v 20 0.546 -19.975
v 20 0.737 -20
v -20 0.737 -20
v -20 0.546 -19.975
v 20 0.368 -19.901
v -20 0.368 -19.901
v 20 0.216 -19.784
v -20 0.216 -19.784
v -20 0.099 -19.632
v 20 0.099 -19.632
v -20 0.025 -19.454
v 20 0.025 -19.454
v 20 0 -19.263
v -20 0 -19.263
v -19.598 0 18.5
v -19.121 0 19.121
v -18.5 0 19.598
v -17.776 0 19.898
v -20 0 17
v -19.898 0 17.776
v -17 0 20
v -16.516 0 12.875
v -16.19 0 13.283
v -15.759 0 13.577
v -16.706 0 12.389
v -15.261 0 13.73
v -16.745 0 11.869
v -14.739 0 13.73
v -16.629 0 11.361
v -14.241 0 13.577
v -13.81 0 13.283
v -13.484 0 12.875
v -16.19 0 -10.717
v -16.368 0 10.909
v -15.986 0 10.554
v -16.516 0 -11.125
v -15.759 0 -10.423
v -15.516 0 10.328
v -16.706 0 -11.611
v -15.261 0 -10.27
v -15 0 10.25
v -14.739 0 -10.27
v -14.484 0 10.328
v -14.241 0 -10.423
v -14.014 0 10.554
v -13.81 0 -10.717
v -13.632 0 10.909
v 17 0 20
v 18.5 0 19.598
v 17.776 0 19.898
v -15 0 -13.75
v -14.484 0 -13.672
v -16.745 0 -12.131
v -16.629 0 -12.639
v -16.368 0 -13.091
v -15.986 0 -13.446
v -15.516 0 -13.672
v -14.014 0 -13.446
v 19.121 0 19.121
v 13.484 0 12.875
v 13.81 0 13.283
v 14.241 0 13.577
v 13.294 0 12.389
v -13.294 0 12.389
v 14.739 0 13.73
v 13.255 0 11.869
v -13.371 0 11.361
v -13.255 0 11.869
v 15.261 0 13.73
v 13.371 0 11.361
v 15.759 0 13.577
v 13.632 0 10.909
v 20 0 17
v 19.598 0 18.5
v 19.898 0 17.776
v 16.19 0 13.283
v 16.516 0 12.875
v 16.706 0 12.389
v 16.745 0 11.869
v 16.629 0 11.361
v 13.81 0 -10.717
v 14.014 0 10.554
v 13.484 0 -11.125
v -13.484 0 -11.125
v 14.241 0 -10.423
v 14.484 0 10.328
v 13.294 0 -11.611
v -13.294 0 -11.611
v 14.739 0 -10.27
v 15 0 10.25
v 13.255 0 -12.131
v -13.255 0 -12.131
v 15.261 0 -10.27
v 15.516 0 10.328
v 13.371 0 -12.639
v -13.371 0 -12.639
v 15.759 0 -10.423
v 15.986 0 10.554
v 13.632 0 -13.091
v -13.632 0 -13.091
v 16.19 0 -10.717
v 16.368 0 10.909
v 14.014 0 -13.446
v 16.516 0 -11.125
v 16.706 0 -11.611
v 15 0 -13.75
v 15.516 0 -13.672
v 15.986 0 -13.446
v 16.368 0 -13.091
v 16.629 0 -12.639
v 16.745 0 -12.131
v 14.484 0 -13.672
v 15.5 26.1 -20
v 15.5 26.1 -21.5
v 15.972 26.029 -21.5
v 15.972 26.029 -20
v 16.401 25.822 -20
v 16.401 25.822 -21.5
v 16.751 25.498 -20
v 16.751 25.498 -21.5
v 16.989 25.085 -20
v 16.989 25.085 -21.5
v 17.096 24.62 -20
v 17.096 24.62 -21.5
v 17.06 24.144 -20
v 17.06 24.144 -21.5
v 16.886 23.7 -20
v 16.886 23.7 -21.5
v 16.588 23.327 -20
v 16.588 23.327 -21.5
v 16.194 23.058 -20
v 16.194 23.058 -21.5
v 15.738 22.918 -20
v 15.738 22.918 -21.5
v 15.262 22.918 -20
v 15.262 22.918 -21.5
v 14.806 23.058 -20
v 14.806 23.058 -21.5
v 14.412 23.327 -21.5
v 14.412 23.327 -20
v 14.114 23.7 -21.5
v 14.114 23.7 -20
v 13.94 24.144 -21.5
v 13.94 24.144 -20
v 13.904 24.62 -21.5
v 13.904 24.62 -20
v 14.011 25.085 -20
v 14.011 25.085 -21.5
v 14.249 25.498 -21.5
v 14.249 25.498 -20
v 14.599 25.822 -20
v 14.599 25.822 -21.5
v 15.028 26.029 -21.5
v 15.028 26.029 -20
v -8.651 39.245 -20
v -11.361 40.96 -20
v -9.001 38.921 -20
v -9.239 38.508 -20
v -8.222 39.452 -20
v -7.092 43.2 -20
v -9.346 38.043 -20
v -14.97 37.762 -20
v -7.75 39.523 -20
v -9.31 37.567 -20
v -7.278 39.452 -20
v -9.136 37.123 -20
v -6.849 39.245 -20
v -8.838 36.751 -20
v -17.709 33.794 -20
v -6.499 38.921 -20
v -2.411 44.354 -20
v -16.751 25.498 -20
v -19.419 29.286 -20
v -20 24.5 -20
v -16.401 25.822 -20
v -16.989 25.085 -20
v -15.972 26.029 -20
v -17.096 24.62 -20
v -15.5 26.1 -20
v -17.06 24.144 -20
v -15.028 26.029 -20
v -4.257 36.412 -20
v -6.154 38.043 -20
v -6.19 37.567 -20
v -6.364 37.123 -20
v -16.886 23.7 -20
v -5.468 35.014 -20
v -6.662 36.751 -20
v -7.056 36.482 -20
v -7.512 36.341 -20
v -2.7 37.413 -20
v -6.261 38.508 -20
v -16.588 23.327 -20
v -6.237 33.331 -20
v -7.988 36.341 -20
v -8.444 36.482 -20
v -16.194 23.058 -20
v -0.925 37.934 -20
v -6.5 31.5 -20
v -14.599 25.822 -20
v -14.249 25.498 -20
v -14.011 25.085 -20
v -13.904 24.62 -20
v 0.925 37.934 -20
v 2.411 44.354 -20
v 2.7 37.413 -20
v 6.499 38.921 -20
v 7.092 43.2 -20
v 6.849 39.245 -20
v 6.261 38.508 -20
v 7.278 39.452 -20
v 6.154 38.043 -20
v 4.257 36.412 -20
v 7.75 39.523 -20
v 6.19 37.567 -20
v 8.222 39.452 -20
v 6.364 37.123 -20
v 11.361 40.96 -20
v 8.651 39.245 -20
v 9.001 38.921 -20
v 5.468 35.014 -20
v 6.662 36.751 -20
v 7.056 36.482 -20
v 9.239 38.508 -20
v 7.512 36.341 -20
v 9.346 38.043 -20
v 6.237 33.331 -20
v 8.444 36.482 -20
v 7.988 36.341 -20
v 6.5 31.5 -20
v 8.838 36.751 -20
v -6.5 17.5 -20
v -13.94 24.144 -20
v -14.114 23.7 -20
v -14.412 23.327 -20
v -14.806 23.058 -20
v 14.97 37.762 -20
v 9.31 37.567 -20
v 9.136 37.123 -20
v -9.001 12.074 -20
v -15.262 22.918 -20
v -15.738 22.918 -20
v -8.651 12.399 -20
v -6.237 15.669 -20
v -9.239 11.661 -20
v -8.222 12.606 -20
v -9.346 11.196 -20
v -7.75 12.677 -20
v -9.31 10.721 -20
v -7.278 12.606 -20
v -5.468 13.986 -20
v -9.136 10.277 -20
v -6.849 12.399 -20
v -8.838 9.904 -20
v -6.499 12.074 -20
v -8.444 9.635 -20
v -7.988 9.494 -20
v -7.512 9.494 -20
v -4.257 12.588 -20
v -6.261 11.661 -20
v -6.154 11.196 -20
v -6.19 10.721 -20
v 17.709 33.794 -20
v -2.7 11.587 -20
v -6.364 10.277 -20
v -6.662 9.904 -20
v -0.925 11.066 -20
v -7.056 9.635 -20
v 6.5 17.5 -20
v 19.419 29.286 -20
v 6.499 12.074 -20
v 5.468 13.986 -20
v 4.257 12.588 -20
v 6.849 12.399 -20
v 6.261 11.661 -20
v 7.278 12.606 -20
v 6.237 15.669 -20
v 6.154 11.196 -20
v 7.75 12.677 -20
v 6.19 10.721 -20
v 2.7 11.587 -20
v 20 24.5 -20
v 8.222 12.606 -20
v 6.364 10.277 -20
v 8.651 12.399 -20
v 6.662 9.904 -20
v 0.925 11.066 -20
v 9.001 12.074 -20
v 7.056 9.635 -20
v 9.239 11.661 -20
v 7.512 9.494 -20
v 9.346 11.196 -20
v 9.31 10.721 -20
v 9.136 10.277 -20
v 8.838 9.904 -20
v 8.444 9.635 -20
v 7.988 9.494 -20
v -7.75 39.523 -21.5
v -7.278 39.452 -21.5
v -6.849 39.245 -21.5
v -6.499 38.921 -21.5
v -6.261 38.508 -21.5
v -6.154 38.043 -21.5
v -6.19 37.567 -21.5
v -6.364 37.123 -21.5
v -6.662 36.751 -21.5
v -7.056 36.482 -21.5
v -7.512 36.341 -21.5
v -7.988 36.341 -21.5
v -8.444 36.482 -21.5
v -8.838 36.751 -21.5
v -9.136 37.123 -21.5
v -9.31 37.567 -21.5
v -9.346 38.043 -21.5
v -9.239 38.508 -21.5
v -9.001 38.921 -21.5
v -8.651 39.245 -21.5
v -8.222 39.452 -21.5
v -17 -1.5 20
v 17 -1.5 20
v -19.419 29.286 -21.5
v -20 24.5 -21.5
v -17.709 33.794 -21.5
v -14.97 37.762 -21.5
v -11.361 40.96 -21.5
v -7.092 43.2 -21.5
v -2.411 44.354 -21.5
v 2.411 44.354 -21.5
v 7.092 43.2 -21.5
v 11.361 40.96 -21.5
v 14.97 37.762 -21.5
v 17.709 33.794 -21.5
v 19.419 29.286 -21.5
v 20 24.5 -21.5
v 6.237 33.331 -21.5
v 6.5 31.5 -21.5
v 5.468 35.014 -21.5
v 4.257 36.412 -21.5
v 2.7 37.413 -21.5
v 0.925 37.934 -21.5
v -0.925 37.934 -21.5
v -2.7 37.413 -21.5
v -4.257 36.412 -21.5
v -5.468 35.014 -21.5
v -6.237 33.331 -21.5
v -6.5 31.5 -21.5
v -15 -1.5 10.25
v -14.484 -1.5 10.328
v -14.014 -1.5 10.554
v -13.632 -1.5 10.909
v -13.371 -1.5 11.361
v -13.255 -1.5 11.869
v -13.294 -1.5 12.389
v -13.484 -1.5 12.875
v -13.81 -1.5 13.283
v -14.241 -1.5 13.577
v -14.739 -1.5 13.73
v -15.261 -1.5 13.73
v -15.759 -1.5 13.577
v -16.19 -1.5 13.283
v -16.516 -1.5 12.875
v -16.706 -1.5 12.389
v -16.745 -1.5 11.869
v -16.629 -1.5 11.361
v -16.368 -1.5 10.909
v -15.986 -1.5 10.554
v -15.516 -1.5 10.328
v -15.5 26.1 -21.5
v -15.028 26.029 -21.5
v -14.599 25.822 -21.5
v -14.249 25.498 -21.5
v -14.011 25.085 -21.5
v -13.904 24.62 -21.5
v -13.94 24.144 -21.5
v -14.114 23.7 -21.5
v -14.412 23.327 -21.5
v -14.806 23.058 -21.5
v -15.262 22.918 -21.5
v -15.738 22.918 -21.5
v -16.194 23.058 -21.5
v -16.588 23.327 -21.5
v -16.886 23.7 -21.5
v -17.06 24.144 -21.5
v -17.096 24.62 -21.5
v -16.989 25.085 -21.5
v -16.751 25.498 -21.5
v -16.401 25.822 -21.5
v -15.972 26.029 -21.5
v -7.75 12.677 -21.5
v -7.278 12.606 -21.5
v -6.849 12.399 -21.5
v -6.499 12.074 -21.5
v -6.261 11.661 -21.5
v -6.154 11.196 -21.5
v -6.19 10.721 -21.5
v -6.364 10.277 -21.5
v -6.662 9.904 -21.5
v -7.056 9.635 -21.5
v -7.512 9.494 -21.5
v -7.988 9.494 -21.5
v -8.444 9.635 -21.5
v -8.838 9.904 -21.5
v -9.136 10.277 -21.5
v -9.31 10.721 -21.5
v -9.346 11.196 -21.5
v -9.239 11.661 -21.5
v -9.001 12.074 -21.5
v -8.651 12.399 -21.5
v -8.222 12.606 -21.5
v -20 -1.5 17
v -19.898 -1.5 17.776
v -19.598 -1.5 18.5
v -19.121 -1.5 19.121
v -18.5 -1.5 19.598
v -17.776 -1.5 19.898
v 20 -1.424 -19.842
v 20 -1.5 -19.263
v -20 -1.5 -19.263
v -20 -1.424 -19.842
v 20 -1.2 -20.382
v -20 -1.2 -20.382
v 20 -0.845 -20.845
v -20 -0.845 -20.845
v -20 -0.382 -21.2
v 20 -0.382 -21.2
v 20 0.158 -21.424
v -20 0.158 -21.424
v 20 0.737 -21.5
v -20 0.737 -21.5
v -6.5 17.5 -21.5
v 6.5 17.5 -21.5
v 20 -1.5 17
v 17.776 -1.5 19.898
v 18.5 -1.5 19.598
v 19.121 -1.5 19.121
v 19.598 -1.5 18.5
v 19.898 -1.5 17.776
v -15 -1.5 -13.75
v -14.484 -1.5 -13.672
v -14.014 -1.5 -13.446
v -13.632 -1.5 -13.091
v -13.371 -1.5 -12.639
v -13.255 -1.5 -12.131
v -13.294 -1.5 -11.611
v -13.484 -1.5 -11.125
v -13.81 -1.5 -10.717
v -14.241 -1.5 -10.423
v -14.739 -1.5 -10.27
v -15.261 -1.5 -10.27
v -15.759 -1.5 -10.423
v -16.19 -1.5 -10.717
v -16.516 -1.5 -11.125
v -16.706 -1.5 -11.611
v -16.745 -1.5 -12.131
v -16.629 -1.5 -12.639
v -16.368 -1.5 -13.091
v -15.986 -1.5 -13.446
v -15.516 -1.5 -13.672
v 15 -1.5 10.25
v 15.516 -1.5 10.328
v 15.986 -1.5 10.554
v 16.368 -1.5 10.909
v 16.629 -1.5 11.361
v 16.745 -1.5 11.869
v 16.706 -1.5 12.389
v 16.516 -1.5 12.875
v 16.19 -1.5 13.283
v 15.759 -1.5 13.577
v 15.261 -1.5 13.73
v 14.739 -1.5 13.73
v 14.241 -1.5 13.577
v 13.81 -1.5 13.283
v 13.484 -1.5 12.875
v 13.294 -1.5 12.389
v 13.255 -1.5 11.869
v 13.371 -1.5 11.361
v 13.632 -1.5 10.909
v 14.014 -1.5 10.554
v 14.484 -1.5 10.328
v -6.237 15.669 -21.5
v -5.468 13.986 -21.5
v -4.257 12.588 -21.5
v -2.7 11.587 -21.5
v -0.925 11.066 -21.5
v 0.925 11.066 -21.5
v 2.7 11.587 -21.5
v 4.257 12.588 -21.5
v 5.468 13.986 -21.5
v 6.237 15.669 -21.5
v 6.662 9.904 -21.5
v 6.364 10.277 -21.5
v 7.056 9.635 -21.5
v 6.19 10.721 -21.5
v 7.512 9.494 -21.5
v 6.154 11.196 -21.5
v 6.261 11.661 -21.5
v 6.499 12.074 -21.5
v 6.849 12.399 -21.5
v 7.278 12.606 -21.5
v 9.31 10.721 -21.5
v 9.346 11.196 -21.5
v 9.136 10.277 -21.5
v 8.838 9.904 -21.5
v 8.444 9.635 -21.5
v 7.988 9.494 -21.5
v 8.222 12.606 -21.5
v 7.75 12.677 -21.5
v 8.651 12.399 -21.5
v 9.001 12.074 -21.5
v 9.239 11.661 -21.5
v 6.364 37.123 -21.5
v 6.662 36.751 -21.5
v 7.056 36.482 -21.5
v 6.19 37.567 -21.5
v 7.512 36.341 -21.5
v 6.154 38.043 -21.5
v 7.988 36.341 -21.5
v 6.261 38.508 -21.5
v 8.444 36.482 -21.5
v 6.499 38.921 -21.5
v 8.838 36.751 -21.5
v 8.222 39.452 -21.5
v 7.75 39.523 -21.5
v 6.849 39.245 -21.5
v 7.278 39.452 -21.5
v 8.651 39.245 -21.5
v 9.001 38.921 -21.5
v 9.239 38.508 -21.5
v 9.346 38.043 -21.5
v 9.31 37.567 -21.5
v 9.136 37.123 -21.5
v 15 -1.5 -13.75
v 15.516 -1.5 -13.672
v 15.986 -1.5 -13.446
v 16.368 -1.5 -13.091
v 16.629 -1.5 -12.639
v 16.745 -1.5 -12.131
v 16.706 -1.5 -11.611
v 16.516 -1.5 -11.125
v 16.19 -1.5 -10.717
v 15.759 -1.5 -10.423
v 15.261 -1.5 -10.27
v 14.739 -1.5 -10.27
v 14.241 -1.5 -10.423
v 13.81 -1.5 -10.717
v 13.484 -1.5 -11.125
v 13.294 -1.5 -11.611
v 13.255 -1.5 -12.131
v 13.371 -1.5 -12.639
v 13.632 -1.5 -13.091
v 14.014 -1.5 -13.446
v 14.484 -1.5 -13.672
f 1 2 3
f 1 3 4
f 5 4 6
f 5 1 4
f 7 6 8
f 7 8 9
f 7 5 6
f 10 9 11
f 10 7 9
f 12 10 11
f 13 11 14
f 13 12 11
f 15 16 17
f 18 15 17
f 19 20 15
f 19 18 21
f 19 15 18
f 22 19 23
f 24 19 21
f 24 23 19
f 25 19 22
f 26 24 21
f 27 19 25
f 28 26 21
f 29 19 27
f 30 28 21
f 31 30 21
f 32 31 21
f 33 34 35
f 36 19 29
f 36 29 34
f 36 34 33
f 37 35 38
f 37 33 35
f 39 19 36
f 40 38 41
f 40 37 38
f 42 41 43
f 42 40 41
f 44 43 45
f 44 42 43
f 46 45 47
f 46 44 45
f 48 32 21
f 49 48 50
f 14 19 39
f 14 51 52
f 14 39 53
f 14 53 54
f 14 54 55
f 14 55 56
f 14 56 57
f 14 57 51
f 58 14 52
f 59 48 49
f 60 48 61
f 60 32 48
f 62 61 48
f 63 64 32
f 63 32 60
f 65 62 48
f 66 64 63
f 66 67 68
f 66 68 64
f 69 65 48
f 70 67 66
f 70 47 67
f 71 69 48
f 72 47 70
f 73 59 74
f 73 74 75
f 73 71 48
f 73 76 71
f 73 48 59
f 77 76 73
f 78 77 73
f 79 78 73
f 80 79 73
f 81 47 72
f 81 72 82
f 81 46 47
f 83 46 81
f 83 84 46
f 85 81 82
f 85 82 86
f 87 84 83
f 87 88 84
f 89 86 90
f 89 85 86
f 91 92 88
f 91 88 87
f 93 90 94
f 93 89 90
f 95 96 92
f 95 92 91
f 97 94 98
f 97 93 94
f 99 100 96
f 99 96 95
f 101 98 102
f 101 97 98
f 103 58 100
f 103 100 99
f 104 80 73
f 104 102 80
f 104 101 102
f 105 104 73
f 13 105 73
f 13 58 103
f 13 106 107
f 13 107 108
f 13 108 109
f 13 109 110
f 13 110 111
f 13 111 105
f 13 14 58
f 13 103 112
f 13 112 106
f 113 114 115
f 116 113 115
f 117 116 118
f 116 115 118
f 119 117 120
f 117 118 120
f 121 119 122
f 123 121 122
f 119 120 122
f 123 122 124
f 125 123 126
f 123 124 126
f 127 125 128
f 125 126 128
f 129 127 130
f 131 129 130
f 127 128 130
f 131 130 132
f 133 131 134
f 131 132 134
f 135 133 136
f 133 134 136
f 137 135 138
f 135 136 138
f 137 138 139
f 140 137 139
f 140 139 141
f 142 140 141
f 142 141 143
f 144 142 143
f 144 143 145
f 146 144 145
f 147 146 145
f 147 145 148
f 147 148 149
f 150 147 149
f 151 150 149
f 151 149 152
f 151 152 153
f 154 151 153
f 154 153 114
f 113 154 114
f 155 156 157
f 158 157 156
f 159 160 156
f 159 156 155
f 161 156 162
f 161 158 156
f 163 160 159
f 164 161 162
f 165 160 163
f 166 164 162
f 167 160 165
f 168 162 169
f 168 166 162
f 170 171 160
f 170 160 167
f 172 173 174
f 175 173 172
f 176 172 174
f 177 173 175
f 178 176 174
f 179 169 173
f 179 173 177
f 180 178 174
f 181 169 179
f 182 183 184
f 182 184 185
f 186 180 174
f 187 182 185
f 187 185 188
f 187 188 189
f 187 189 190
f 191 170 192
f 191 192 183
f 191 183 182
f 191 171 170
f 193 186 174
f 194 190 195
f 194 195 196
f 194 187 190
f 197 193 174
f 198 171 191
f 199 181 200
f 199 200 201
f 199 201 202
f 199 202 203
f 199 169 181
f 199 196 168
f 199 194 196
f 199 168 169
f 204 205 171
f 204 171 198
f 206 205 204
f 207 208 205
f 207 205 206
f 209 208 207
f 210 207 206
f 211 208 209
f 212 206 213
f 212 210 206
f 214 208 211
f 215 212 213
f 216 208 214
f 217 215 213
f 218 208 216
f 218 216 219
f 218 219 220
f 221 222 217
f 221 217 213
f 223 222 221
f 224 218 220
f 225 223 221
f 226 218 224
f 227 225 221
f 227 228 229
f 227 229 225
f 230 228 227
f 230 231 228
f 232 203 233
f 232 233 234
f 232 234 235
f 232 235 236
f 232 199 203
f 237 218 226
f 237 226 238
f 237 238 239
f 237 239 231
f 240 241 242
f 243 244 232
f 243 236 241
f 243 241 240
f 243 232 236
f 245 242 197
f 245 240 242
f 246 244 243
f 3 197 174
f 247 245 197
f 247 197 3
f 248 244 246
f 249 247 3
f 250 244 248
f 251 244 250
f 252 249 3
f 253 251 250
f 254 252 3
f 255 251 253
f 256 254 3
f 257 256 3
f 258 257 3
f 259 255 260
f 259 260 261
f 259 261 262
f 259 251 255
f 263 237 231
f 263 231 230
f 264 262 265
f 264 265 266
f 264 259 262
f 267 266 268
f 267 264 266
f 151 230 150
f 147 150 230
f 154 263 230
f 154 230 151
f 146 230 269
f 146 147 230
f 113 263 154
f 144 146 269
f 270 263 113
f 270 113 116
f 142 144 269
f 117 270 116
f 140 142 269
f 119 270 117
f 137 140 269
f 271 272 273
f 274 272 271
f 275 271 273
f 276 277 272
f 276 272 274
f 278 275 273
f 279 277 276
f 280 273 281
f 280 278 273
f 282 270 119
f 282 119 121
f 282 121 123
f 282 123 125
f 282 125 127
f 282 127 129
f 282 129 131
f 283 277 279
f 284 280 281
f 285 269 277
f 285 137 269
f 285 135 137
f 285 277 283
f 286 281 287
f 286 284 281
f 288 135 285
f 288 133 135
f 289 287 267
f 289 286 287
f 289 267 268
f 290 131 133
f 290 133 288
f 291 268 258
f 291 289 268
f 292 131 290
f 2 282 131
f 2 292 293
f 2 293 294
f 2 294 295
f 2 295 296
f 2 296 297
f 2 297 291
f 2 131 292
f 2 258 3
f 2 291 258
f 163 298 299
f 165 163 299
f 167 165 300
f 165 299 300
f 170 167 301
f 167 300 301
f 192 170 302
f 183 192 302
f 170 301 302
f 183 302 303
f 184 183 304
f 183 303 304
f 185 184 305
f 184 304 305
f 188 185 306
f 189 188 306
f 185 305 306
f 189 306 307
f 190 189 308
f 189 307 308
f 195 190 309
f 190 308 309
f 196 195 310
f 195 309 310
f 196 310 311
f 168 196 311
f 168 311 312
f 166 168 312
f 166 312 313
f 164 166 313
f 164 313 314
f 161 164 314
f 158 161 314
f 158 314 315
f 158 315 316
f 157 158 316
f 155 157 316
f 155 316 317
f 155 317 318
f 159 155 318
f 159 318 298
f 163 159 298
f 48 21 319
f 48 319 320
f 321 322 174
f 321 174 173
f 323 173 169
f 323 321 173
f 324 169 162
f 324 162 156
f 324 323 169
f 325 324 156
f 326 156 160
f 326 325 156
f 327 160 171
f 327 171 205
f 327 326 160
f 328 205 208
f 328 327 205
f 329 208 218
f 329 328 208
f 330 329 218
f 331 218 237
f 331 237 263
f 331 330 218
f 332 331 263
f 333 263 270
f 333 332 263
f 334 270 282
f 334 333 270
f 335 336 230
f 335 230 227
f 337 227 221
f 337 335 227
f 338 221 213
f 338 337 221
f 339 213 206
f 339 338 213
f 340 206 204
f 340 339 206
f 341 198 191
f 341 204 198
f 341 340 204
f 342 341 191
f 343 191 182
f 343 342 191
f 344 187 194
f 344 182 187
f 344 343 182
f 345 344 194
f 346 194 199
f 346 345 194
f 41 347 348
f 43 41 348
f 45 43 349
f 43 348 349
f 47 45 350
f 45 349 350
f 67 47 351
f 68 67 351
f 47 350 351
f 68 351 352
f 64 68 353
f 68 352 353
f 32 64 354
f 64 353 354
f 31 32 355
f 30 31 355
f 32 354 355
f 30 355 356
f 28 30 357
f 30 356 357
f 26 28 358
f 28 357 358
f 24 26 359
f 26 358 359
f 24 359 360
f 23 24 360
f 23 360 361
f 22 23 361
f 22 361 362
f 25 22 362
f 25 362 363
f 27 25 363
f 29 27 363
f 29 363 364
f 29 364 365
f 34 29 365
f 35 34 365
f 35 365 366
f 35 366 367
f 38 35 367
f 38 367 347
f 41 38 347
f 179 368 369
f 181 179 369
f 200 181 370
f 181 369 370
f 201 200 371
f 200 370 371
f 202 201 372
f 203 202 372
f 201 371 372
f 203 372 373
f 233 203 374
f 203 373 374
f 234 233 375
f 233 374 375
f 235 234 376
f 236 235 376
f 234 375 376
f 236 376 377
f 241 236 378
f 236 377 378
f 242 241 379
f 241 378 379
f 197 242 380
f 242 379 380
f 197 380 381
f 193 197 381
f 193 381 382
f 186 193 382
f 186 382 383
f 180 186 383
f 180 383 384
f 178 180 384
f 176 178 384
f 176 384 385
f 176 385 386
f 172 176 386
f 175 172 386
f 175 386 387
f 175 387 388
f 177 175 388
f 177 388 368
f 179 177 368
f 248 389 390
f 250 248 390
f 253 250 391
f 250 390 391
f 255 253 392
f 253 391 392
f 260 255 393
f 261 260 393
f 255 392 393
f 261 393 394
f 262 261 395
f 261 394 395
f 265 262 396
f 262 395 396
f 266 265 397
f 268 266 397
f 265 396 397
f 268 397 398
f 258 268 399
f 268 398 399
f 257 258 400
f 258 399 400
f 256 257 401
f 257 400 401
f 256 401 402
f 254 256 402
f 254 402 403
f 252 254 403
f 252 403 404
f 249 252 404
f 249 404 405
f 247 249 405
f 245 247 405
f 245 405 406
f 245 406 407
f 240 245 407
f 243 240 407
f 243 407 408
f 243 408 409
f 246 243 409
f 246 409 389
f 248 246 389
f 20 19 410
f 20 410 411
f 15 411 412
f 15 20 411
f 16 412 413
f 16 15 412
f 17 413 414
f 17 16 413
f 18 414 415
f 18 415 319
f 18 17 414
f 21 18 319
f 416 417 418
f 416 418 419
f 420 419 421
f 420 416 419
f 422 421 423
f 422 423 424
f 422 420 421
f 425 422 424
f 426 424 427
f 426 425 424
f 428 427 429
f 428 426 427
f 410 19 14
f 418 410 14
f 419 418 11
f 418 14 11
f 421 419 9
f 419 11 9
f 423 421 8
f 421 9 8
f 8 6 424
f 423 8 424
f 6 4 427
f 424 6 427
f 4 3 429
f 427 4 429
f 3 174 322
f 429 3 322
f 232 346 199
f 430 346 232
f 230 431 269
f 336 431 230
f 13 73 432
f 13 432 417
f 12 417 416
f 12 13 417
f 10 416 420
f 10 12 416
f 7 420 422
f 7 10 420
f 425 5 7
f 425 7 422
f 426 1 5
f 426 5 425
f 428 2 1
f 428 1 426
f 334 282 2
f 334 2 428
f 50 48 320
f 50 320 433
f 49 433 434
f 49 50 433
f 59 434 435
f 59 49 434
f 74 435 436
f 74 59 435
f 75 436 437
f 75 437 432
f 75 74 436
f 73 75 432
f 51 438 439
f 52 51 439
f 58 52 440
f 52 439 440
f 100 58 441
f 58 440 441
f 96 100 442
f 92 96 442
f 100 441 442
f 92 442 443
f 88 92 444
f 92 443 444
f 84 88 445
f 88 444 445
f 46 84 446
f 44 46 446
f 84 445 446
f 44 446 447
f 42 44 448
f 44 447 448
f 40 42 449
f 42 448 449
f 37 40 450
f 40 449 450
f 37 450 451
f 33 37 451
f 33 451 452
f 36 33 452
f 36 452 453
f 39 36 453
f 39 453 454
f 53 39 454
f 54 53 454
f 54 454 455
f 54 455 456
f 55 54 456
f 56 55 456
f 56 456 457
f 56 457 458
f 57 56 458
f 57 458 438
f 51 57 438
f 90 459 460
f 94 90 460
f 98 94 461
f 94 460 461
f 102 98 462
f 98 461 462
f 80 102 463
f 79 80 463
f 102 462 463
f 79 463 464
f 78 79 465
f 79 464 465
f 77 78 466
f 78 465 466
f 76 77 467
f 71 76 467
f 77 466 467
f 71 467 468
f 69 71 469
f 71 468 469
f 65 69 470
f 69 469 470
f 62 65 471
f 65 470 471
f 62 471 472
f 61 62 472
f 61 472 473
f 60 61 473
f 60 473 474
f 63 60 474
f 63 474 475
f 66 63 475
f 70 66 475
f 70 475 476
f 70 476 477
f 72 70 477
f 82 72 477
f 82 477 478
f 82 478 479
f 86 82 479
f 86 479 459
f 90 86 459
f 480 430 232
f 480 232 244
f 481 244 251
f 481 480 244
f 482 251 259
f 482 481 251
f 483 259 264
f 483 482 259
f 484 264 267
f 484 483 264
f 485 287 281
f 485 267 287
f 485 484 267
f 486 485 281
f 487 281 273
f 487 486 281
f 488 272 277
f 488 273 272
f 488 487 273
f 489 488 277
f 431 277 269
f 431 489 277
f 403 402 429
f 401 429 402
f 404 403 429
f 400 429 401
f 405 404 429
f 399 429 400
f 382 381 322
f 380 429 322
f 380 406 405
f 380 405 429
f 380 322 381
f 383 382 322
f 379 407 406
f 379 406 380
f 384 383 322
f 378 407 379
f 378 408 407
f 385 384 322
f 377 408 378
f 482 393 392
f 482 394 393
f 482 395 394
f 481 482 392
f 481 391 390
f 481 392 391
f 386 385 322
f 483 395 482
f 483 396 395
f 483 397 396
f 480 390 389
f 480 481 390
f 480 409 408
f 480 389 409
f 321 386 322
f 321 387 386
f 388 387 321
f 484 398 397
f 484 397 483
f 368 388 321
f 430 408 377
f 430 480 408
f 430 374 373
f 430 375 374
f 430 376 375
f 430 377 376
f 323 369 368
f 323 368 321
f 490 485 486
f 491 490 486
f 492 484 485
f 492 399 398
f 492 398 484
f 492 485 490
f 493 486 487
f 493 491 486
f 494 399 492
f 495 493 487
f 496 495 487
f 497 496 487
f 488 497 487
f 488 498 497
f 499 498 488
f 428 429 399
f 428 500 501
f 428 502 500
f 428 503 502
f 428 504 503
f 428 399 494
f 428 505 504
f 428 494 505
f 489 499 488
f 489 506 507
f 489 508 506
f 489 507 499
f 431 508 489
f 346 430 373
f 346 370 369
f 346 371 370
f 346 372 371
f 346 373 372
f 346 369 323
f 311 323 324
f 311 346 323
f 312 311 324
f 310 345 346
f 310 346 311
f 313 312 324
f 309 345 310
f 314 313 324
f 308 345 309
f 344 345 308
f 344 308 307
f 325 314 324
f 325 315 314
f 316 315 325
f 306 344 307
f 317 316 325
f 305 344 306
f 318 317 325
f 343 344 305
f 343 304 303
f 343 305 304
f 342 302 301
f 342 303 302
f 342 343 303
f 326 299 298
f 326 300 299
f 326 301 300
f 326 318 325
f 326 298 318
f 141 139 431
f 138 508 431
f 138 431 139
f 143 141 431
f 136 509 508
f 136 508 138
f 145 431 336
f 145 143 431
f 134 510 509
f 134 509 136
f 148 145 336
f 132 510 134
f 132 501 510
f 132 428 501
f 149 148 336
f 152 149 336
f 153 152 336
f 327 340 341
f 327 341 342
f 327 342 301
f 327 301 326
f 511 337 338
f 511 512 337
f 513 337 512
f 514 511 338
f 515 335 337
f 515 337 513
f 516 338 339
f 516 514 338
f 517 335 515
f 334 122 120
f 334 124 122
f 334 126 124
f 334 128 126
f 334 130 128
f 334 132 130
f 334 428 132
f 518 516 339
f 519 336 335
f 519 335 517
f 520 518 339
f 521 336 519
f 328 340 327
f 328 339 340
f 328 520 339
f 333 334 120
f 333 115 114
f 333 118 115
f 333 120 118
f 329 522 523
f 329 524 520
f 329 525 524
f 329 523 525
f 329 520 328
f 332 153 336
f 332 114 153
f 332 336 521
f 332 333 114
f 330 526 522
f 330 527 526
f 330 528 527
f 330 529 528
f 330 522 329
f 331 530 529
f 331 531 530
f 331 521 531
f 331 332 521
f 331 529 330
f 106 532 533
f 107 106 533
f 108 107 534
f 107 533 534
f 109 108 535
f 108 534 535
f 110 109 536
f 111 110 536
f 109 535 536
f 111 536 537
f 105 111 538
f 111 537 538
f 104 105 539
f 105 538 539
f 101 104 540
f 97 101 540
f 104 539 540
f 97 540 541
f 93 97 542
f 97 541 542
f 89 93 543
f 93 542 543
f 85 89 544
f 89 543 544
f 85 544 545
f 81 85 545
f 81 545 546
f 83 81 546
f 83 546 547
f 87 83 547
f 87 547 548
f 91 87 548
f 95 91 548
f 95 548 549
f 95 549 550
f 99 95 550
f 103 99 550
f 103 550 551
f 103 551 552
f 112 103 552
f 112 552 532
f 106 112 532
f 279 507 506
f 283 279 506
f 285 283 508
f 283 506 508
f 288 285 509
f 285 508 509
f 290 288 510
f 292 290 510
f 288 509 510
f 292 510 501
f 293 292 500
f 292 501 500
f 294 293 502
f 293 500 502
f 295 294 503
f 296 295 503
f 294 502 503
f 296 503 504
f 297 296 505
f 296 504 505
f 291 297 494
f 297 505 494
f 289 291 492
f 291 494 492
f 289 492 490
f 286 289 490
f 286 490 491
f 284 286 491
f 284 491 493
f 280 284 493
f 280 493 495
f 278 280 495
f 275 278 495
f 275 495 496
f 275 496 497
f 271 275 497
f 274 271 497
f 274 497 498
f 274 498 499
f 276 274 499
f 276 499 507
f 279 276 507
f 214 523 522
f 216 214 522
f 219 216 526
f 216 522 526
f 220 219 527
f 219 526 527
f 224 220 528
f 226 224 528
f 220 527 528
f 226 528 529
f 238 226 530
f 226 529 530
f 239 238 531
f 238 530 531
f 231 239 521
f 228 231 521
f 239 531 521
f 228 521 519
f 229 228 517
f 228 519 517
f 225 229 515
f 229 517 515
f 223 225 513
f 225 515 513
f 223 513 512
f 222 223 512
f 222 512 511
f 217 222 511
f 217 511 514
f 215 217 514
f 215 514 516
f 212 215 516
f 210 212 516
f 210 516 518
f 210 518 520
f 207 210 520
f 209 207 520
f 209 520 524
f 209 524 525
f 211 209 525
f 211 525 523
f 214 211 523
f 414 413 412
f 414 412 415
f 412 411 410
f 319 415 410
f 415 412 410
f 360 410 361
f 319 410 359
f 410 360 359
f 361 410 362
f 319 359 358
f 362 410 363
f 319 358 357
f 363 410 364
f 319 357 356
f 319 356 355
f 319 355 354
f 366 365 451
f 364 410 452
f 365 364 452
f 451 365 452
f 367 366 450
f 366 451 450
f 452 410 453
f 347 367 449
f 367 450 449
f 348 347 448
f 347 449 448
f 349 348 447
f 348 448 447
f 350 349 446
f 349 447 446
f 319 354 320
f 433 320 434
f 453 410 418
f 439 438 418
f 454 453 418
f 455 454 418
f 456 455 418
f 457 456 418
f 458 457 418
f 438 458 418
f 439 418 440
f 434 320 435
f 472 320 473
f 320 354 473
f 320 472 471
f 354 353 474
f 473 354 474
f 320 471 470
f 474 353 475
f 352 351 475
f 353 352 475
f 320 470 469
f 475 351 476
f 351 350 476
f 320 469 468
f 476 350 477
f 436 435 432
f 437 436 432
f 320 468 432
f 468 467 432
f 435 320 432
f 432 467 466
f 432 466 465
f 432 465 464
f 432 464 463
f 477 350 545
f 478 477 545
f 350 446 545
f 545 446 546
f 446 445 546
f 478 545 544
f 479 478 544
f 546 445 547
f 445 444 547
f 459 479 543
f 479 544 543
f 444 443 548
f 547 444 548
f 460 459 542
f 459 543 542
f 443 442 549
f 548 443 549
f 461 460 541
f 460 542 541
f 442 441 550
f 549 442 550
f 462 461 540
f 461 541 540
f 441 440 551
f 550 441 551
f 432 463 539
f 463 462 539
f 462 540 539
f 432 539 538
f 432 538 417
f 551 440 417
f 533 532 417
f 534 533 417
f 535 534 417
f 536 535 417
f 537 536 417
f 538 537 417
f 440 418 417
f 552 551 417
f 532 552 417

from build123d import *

# Parameters (mm, degrees)
SM_BASE_FLANGE_1_DEPTH           = 1.5
SM_EDGE_FLANGE_1_STRIP_W         = 7.4732
SM_EDGE_FLANGE_1_STRIP_H         = 1.5
SM_EDGE_FLANGE_1_STRIP_CUT_DEPTH = 40
SM_EDGE_FLANGE_1_DEPTH           = 40
CUT_EXTRUDE_1_DEPTH              = 10
SKETCH_10_R                      = 1.6
CUT_EXTRUDE_2_DEPTH              = 10
SKETCH_11_R                      = 1.75
CUT_EXTRUDE_3_DEPTH              = 10


# Sheet-metal steps are written as plain solids
with BuildPart() as part:
    # Sketch 1 → 基体-法兰1 (new body)
    with BuildSketch(Plane(origin=(0, 0, 0), x_dir=(1, 0, 0), z_dir=(0, 1, 0))):
        with BuildLine():
            Line((-17, -20), (17, -20))
            ThreePointArc((17, -20), (19.121320344, -19.121320344), (20, -17))
            Line((20, -17), (20, 20))
            Line((20, 20), (-20, 20))
            Line((-20, 20), (-20, -17))
            ThreePointArc((-20, -17), (-19.121320344, -19.121320344), (-17, -20))
        make_face()
    extrude(amount=-SM_BASE_FLANGE_1_DEPTH)

    # 边线-法兰1 strip (across the edge) → 边线-法兰1 strip cut (cut)
    with BuildSketch(Plane(origin=(20, 0, -20), x_dir=(0, 0, 1), z_dir=(-1, 0, 0))):
        with Locations((-3, -0.75)):
            Rectangle(SM_EDGE_FLANGE_1_STRIP_W, SM_EDGE_FLANGE_1_STRIP_H)
    extrude(amount=SM_EDGE_FLANGE_1_STRIP_CUT_DEPTH, mode=Mode.SUBTRACT)

    # 边线-法兰1 section (across the edge) → 边线-法兰1 (add)
    with BuildSketch(Plane(origin=(20, 0, -20), x_dir=(0, 0, 1), z_dir=(-1, 0, 0))):
        with BuildLine():
            Line((-1.5, 0.7366), (-1.5, 44.5))
            Line((-1.5, 44.5), (0, 44.5))
            Line((0, 44.5), (0, 0.7366))
            ThreePointArc((0, 0.7366), (0.215745145, 0.215745145), (0.7366, 0))
            Line((0.7366, 0), (0.7366, -1.5))
            ThreePointArc((0.7366, -1.5), (-0.844915027, -0.844915027), (-1.5, 0.7366))
        make_face()
    extrude(amount=SM_EDGE_FLANGE_1_DEPTH)

    # 草图9 → 切除-拉伸1 (cut)
    with BuildSketch(Plane(origin=(0, 0, -21.5), x_dir=(-1, 0, 0), z_dir=(0, 0, -1))):
        with BuildLine():
            Line((-20, 24.5), (-20, 44.5))
            Line((-20, 44.5), (25.146997012, 48.516846867))
            Line((25.146997012, 48.516846867), (20, 24.5))
            ThreePointArc((20, 24.5), (0, 44.5), (-20, 24.5))
        make_face()
    extrude(amount=-CUT_EXTRUDE_1_DEPTH, mode=Mode.SUBTRACT)

    # 草图10 → 切除-拉伸2 (cut)
    with BuildSketch(Plane(origin=(0, 0, -21.5), x_dir=(-1, 0, 0), z_dir=(0, 0, -1))):
        with Locations(Location((7.75, 37.923393759, 0), (0, 0, 90))):
            Circle(SKETCH_10_R)
        with Locations(Location((15.5, 24.5, 0), (0, 0, 90))):
            Circle(SKETCH_10_R)
        with Locations(Location((7.75, 11.076606241, 0), (0, 0, 90))):
            Circle(SKETCH_10_R)
        with Locations(Location((-7.75, 11.076606241, 0), (0, 0, 90))):
            Circle(SKETCH_10_R)
        with Locations(Location((-15.5, 24.5, 0), (0, 0, 90))):
            Circle(SKETCH_10_R)
        with Locations(Location((-7.75, 37.923393759, 0), (0, 0, 90))):
            Circle(SKETCH_10_R)
        with BuildLine():
            Line((-6.5, 17.5), (-6.5, 31.5))
            ThreePointArc((-6.5, 31.5), (0, 38), (6.5, 31.5))
            Line((6.5, 31.5), (6.5, 17.5))
            ThreePointArc((6.5, 17.5), (0, 11), (-6.5, 17.5))
        make_face()
    extrude(amount=-CUT_EXTRUDE_2_DEPTH, mode=Mode.SUBTRACT)

    # 草图11 → 切除-拉伸3 (cut)
    with BuildSketch(Plane.XZ.offset(1.5)):
        with Locations(Location((15, 12, 0), (0, 0, 270))):
            Circle(SKETCH_11_R)
        with Locations(Location((-15, 12, 0), (0, 0, 270))):
            Circle(SKETCH_11_R)
        with Locations(Location((-15, -12, 0), (0, 0, 270))):
            Circle(SKETCH_11_R)
        with Locations(Location((15, -12, 0), (0, 0, 270))):
            Circle(SKETCH_11_R)
    extrude(amount=-CUT_EXTRUDE_3_DEPTH, mode=Mode.SUBTRACT)


solid = part.part
